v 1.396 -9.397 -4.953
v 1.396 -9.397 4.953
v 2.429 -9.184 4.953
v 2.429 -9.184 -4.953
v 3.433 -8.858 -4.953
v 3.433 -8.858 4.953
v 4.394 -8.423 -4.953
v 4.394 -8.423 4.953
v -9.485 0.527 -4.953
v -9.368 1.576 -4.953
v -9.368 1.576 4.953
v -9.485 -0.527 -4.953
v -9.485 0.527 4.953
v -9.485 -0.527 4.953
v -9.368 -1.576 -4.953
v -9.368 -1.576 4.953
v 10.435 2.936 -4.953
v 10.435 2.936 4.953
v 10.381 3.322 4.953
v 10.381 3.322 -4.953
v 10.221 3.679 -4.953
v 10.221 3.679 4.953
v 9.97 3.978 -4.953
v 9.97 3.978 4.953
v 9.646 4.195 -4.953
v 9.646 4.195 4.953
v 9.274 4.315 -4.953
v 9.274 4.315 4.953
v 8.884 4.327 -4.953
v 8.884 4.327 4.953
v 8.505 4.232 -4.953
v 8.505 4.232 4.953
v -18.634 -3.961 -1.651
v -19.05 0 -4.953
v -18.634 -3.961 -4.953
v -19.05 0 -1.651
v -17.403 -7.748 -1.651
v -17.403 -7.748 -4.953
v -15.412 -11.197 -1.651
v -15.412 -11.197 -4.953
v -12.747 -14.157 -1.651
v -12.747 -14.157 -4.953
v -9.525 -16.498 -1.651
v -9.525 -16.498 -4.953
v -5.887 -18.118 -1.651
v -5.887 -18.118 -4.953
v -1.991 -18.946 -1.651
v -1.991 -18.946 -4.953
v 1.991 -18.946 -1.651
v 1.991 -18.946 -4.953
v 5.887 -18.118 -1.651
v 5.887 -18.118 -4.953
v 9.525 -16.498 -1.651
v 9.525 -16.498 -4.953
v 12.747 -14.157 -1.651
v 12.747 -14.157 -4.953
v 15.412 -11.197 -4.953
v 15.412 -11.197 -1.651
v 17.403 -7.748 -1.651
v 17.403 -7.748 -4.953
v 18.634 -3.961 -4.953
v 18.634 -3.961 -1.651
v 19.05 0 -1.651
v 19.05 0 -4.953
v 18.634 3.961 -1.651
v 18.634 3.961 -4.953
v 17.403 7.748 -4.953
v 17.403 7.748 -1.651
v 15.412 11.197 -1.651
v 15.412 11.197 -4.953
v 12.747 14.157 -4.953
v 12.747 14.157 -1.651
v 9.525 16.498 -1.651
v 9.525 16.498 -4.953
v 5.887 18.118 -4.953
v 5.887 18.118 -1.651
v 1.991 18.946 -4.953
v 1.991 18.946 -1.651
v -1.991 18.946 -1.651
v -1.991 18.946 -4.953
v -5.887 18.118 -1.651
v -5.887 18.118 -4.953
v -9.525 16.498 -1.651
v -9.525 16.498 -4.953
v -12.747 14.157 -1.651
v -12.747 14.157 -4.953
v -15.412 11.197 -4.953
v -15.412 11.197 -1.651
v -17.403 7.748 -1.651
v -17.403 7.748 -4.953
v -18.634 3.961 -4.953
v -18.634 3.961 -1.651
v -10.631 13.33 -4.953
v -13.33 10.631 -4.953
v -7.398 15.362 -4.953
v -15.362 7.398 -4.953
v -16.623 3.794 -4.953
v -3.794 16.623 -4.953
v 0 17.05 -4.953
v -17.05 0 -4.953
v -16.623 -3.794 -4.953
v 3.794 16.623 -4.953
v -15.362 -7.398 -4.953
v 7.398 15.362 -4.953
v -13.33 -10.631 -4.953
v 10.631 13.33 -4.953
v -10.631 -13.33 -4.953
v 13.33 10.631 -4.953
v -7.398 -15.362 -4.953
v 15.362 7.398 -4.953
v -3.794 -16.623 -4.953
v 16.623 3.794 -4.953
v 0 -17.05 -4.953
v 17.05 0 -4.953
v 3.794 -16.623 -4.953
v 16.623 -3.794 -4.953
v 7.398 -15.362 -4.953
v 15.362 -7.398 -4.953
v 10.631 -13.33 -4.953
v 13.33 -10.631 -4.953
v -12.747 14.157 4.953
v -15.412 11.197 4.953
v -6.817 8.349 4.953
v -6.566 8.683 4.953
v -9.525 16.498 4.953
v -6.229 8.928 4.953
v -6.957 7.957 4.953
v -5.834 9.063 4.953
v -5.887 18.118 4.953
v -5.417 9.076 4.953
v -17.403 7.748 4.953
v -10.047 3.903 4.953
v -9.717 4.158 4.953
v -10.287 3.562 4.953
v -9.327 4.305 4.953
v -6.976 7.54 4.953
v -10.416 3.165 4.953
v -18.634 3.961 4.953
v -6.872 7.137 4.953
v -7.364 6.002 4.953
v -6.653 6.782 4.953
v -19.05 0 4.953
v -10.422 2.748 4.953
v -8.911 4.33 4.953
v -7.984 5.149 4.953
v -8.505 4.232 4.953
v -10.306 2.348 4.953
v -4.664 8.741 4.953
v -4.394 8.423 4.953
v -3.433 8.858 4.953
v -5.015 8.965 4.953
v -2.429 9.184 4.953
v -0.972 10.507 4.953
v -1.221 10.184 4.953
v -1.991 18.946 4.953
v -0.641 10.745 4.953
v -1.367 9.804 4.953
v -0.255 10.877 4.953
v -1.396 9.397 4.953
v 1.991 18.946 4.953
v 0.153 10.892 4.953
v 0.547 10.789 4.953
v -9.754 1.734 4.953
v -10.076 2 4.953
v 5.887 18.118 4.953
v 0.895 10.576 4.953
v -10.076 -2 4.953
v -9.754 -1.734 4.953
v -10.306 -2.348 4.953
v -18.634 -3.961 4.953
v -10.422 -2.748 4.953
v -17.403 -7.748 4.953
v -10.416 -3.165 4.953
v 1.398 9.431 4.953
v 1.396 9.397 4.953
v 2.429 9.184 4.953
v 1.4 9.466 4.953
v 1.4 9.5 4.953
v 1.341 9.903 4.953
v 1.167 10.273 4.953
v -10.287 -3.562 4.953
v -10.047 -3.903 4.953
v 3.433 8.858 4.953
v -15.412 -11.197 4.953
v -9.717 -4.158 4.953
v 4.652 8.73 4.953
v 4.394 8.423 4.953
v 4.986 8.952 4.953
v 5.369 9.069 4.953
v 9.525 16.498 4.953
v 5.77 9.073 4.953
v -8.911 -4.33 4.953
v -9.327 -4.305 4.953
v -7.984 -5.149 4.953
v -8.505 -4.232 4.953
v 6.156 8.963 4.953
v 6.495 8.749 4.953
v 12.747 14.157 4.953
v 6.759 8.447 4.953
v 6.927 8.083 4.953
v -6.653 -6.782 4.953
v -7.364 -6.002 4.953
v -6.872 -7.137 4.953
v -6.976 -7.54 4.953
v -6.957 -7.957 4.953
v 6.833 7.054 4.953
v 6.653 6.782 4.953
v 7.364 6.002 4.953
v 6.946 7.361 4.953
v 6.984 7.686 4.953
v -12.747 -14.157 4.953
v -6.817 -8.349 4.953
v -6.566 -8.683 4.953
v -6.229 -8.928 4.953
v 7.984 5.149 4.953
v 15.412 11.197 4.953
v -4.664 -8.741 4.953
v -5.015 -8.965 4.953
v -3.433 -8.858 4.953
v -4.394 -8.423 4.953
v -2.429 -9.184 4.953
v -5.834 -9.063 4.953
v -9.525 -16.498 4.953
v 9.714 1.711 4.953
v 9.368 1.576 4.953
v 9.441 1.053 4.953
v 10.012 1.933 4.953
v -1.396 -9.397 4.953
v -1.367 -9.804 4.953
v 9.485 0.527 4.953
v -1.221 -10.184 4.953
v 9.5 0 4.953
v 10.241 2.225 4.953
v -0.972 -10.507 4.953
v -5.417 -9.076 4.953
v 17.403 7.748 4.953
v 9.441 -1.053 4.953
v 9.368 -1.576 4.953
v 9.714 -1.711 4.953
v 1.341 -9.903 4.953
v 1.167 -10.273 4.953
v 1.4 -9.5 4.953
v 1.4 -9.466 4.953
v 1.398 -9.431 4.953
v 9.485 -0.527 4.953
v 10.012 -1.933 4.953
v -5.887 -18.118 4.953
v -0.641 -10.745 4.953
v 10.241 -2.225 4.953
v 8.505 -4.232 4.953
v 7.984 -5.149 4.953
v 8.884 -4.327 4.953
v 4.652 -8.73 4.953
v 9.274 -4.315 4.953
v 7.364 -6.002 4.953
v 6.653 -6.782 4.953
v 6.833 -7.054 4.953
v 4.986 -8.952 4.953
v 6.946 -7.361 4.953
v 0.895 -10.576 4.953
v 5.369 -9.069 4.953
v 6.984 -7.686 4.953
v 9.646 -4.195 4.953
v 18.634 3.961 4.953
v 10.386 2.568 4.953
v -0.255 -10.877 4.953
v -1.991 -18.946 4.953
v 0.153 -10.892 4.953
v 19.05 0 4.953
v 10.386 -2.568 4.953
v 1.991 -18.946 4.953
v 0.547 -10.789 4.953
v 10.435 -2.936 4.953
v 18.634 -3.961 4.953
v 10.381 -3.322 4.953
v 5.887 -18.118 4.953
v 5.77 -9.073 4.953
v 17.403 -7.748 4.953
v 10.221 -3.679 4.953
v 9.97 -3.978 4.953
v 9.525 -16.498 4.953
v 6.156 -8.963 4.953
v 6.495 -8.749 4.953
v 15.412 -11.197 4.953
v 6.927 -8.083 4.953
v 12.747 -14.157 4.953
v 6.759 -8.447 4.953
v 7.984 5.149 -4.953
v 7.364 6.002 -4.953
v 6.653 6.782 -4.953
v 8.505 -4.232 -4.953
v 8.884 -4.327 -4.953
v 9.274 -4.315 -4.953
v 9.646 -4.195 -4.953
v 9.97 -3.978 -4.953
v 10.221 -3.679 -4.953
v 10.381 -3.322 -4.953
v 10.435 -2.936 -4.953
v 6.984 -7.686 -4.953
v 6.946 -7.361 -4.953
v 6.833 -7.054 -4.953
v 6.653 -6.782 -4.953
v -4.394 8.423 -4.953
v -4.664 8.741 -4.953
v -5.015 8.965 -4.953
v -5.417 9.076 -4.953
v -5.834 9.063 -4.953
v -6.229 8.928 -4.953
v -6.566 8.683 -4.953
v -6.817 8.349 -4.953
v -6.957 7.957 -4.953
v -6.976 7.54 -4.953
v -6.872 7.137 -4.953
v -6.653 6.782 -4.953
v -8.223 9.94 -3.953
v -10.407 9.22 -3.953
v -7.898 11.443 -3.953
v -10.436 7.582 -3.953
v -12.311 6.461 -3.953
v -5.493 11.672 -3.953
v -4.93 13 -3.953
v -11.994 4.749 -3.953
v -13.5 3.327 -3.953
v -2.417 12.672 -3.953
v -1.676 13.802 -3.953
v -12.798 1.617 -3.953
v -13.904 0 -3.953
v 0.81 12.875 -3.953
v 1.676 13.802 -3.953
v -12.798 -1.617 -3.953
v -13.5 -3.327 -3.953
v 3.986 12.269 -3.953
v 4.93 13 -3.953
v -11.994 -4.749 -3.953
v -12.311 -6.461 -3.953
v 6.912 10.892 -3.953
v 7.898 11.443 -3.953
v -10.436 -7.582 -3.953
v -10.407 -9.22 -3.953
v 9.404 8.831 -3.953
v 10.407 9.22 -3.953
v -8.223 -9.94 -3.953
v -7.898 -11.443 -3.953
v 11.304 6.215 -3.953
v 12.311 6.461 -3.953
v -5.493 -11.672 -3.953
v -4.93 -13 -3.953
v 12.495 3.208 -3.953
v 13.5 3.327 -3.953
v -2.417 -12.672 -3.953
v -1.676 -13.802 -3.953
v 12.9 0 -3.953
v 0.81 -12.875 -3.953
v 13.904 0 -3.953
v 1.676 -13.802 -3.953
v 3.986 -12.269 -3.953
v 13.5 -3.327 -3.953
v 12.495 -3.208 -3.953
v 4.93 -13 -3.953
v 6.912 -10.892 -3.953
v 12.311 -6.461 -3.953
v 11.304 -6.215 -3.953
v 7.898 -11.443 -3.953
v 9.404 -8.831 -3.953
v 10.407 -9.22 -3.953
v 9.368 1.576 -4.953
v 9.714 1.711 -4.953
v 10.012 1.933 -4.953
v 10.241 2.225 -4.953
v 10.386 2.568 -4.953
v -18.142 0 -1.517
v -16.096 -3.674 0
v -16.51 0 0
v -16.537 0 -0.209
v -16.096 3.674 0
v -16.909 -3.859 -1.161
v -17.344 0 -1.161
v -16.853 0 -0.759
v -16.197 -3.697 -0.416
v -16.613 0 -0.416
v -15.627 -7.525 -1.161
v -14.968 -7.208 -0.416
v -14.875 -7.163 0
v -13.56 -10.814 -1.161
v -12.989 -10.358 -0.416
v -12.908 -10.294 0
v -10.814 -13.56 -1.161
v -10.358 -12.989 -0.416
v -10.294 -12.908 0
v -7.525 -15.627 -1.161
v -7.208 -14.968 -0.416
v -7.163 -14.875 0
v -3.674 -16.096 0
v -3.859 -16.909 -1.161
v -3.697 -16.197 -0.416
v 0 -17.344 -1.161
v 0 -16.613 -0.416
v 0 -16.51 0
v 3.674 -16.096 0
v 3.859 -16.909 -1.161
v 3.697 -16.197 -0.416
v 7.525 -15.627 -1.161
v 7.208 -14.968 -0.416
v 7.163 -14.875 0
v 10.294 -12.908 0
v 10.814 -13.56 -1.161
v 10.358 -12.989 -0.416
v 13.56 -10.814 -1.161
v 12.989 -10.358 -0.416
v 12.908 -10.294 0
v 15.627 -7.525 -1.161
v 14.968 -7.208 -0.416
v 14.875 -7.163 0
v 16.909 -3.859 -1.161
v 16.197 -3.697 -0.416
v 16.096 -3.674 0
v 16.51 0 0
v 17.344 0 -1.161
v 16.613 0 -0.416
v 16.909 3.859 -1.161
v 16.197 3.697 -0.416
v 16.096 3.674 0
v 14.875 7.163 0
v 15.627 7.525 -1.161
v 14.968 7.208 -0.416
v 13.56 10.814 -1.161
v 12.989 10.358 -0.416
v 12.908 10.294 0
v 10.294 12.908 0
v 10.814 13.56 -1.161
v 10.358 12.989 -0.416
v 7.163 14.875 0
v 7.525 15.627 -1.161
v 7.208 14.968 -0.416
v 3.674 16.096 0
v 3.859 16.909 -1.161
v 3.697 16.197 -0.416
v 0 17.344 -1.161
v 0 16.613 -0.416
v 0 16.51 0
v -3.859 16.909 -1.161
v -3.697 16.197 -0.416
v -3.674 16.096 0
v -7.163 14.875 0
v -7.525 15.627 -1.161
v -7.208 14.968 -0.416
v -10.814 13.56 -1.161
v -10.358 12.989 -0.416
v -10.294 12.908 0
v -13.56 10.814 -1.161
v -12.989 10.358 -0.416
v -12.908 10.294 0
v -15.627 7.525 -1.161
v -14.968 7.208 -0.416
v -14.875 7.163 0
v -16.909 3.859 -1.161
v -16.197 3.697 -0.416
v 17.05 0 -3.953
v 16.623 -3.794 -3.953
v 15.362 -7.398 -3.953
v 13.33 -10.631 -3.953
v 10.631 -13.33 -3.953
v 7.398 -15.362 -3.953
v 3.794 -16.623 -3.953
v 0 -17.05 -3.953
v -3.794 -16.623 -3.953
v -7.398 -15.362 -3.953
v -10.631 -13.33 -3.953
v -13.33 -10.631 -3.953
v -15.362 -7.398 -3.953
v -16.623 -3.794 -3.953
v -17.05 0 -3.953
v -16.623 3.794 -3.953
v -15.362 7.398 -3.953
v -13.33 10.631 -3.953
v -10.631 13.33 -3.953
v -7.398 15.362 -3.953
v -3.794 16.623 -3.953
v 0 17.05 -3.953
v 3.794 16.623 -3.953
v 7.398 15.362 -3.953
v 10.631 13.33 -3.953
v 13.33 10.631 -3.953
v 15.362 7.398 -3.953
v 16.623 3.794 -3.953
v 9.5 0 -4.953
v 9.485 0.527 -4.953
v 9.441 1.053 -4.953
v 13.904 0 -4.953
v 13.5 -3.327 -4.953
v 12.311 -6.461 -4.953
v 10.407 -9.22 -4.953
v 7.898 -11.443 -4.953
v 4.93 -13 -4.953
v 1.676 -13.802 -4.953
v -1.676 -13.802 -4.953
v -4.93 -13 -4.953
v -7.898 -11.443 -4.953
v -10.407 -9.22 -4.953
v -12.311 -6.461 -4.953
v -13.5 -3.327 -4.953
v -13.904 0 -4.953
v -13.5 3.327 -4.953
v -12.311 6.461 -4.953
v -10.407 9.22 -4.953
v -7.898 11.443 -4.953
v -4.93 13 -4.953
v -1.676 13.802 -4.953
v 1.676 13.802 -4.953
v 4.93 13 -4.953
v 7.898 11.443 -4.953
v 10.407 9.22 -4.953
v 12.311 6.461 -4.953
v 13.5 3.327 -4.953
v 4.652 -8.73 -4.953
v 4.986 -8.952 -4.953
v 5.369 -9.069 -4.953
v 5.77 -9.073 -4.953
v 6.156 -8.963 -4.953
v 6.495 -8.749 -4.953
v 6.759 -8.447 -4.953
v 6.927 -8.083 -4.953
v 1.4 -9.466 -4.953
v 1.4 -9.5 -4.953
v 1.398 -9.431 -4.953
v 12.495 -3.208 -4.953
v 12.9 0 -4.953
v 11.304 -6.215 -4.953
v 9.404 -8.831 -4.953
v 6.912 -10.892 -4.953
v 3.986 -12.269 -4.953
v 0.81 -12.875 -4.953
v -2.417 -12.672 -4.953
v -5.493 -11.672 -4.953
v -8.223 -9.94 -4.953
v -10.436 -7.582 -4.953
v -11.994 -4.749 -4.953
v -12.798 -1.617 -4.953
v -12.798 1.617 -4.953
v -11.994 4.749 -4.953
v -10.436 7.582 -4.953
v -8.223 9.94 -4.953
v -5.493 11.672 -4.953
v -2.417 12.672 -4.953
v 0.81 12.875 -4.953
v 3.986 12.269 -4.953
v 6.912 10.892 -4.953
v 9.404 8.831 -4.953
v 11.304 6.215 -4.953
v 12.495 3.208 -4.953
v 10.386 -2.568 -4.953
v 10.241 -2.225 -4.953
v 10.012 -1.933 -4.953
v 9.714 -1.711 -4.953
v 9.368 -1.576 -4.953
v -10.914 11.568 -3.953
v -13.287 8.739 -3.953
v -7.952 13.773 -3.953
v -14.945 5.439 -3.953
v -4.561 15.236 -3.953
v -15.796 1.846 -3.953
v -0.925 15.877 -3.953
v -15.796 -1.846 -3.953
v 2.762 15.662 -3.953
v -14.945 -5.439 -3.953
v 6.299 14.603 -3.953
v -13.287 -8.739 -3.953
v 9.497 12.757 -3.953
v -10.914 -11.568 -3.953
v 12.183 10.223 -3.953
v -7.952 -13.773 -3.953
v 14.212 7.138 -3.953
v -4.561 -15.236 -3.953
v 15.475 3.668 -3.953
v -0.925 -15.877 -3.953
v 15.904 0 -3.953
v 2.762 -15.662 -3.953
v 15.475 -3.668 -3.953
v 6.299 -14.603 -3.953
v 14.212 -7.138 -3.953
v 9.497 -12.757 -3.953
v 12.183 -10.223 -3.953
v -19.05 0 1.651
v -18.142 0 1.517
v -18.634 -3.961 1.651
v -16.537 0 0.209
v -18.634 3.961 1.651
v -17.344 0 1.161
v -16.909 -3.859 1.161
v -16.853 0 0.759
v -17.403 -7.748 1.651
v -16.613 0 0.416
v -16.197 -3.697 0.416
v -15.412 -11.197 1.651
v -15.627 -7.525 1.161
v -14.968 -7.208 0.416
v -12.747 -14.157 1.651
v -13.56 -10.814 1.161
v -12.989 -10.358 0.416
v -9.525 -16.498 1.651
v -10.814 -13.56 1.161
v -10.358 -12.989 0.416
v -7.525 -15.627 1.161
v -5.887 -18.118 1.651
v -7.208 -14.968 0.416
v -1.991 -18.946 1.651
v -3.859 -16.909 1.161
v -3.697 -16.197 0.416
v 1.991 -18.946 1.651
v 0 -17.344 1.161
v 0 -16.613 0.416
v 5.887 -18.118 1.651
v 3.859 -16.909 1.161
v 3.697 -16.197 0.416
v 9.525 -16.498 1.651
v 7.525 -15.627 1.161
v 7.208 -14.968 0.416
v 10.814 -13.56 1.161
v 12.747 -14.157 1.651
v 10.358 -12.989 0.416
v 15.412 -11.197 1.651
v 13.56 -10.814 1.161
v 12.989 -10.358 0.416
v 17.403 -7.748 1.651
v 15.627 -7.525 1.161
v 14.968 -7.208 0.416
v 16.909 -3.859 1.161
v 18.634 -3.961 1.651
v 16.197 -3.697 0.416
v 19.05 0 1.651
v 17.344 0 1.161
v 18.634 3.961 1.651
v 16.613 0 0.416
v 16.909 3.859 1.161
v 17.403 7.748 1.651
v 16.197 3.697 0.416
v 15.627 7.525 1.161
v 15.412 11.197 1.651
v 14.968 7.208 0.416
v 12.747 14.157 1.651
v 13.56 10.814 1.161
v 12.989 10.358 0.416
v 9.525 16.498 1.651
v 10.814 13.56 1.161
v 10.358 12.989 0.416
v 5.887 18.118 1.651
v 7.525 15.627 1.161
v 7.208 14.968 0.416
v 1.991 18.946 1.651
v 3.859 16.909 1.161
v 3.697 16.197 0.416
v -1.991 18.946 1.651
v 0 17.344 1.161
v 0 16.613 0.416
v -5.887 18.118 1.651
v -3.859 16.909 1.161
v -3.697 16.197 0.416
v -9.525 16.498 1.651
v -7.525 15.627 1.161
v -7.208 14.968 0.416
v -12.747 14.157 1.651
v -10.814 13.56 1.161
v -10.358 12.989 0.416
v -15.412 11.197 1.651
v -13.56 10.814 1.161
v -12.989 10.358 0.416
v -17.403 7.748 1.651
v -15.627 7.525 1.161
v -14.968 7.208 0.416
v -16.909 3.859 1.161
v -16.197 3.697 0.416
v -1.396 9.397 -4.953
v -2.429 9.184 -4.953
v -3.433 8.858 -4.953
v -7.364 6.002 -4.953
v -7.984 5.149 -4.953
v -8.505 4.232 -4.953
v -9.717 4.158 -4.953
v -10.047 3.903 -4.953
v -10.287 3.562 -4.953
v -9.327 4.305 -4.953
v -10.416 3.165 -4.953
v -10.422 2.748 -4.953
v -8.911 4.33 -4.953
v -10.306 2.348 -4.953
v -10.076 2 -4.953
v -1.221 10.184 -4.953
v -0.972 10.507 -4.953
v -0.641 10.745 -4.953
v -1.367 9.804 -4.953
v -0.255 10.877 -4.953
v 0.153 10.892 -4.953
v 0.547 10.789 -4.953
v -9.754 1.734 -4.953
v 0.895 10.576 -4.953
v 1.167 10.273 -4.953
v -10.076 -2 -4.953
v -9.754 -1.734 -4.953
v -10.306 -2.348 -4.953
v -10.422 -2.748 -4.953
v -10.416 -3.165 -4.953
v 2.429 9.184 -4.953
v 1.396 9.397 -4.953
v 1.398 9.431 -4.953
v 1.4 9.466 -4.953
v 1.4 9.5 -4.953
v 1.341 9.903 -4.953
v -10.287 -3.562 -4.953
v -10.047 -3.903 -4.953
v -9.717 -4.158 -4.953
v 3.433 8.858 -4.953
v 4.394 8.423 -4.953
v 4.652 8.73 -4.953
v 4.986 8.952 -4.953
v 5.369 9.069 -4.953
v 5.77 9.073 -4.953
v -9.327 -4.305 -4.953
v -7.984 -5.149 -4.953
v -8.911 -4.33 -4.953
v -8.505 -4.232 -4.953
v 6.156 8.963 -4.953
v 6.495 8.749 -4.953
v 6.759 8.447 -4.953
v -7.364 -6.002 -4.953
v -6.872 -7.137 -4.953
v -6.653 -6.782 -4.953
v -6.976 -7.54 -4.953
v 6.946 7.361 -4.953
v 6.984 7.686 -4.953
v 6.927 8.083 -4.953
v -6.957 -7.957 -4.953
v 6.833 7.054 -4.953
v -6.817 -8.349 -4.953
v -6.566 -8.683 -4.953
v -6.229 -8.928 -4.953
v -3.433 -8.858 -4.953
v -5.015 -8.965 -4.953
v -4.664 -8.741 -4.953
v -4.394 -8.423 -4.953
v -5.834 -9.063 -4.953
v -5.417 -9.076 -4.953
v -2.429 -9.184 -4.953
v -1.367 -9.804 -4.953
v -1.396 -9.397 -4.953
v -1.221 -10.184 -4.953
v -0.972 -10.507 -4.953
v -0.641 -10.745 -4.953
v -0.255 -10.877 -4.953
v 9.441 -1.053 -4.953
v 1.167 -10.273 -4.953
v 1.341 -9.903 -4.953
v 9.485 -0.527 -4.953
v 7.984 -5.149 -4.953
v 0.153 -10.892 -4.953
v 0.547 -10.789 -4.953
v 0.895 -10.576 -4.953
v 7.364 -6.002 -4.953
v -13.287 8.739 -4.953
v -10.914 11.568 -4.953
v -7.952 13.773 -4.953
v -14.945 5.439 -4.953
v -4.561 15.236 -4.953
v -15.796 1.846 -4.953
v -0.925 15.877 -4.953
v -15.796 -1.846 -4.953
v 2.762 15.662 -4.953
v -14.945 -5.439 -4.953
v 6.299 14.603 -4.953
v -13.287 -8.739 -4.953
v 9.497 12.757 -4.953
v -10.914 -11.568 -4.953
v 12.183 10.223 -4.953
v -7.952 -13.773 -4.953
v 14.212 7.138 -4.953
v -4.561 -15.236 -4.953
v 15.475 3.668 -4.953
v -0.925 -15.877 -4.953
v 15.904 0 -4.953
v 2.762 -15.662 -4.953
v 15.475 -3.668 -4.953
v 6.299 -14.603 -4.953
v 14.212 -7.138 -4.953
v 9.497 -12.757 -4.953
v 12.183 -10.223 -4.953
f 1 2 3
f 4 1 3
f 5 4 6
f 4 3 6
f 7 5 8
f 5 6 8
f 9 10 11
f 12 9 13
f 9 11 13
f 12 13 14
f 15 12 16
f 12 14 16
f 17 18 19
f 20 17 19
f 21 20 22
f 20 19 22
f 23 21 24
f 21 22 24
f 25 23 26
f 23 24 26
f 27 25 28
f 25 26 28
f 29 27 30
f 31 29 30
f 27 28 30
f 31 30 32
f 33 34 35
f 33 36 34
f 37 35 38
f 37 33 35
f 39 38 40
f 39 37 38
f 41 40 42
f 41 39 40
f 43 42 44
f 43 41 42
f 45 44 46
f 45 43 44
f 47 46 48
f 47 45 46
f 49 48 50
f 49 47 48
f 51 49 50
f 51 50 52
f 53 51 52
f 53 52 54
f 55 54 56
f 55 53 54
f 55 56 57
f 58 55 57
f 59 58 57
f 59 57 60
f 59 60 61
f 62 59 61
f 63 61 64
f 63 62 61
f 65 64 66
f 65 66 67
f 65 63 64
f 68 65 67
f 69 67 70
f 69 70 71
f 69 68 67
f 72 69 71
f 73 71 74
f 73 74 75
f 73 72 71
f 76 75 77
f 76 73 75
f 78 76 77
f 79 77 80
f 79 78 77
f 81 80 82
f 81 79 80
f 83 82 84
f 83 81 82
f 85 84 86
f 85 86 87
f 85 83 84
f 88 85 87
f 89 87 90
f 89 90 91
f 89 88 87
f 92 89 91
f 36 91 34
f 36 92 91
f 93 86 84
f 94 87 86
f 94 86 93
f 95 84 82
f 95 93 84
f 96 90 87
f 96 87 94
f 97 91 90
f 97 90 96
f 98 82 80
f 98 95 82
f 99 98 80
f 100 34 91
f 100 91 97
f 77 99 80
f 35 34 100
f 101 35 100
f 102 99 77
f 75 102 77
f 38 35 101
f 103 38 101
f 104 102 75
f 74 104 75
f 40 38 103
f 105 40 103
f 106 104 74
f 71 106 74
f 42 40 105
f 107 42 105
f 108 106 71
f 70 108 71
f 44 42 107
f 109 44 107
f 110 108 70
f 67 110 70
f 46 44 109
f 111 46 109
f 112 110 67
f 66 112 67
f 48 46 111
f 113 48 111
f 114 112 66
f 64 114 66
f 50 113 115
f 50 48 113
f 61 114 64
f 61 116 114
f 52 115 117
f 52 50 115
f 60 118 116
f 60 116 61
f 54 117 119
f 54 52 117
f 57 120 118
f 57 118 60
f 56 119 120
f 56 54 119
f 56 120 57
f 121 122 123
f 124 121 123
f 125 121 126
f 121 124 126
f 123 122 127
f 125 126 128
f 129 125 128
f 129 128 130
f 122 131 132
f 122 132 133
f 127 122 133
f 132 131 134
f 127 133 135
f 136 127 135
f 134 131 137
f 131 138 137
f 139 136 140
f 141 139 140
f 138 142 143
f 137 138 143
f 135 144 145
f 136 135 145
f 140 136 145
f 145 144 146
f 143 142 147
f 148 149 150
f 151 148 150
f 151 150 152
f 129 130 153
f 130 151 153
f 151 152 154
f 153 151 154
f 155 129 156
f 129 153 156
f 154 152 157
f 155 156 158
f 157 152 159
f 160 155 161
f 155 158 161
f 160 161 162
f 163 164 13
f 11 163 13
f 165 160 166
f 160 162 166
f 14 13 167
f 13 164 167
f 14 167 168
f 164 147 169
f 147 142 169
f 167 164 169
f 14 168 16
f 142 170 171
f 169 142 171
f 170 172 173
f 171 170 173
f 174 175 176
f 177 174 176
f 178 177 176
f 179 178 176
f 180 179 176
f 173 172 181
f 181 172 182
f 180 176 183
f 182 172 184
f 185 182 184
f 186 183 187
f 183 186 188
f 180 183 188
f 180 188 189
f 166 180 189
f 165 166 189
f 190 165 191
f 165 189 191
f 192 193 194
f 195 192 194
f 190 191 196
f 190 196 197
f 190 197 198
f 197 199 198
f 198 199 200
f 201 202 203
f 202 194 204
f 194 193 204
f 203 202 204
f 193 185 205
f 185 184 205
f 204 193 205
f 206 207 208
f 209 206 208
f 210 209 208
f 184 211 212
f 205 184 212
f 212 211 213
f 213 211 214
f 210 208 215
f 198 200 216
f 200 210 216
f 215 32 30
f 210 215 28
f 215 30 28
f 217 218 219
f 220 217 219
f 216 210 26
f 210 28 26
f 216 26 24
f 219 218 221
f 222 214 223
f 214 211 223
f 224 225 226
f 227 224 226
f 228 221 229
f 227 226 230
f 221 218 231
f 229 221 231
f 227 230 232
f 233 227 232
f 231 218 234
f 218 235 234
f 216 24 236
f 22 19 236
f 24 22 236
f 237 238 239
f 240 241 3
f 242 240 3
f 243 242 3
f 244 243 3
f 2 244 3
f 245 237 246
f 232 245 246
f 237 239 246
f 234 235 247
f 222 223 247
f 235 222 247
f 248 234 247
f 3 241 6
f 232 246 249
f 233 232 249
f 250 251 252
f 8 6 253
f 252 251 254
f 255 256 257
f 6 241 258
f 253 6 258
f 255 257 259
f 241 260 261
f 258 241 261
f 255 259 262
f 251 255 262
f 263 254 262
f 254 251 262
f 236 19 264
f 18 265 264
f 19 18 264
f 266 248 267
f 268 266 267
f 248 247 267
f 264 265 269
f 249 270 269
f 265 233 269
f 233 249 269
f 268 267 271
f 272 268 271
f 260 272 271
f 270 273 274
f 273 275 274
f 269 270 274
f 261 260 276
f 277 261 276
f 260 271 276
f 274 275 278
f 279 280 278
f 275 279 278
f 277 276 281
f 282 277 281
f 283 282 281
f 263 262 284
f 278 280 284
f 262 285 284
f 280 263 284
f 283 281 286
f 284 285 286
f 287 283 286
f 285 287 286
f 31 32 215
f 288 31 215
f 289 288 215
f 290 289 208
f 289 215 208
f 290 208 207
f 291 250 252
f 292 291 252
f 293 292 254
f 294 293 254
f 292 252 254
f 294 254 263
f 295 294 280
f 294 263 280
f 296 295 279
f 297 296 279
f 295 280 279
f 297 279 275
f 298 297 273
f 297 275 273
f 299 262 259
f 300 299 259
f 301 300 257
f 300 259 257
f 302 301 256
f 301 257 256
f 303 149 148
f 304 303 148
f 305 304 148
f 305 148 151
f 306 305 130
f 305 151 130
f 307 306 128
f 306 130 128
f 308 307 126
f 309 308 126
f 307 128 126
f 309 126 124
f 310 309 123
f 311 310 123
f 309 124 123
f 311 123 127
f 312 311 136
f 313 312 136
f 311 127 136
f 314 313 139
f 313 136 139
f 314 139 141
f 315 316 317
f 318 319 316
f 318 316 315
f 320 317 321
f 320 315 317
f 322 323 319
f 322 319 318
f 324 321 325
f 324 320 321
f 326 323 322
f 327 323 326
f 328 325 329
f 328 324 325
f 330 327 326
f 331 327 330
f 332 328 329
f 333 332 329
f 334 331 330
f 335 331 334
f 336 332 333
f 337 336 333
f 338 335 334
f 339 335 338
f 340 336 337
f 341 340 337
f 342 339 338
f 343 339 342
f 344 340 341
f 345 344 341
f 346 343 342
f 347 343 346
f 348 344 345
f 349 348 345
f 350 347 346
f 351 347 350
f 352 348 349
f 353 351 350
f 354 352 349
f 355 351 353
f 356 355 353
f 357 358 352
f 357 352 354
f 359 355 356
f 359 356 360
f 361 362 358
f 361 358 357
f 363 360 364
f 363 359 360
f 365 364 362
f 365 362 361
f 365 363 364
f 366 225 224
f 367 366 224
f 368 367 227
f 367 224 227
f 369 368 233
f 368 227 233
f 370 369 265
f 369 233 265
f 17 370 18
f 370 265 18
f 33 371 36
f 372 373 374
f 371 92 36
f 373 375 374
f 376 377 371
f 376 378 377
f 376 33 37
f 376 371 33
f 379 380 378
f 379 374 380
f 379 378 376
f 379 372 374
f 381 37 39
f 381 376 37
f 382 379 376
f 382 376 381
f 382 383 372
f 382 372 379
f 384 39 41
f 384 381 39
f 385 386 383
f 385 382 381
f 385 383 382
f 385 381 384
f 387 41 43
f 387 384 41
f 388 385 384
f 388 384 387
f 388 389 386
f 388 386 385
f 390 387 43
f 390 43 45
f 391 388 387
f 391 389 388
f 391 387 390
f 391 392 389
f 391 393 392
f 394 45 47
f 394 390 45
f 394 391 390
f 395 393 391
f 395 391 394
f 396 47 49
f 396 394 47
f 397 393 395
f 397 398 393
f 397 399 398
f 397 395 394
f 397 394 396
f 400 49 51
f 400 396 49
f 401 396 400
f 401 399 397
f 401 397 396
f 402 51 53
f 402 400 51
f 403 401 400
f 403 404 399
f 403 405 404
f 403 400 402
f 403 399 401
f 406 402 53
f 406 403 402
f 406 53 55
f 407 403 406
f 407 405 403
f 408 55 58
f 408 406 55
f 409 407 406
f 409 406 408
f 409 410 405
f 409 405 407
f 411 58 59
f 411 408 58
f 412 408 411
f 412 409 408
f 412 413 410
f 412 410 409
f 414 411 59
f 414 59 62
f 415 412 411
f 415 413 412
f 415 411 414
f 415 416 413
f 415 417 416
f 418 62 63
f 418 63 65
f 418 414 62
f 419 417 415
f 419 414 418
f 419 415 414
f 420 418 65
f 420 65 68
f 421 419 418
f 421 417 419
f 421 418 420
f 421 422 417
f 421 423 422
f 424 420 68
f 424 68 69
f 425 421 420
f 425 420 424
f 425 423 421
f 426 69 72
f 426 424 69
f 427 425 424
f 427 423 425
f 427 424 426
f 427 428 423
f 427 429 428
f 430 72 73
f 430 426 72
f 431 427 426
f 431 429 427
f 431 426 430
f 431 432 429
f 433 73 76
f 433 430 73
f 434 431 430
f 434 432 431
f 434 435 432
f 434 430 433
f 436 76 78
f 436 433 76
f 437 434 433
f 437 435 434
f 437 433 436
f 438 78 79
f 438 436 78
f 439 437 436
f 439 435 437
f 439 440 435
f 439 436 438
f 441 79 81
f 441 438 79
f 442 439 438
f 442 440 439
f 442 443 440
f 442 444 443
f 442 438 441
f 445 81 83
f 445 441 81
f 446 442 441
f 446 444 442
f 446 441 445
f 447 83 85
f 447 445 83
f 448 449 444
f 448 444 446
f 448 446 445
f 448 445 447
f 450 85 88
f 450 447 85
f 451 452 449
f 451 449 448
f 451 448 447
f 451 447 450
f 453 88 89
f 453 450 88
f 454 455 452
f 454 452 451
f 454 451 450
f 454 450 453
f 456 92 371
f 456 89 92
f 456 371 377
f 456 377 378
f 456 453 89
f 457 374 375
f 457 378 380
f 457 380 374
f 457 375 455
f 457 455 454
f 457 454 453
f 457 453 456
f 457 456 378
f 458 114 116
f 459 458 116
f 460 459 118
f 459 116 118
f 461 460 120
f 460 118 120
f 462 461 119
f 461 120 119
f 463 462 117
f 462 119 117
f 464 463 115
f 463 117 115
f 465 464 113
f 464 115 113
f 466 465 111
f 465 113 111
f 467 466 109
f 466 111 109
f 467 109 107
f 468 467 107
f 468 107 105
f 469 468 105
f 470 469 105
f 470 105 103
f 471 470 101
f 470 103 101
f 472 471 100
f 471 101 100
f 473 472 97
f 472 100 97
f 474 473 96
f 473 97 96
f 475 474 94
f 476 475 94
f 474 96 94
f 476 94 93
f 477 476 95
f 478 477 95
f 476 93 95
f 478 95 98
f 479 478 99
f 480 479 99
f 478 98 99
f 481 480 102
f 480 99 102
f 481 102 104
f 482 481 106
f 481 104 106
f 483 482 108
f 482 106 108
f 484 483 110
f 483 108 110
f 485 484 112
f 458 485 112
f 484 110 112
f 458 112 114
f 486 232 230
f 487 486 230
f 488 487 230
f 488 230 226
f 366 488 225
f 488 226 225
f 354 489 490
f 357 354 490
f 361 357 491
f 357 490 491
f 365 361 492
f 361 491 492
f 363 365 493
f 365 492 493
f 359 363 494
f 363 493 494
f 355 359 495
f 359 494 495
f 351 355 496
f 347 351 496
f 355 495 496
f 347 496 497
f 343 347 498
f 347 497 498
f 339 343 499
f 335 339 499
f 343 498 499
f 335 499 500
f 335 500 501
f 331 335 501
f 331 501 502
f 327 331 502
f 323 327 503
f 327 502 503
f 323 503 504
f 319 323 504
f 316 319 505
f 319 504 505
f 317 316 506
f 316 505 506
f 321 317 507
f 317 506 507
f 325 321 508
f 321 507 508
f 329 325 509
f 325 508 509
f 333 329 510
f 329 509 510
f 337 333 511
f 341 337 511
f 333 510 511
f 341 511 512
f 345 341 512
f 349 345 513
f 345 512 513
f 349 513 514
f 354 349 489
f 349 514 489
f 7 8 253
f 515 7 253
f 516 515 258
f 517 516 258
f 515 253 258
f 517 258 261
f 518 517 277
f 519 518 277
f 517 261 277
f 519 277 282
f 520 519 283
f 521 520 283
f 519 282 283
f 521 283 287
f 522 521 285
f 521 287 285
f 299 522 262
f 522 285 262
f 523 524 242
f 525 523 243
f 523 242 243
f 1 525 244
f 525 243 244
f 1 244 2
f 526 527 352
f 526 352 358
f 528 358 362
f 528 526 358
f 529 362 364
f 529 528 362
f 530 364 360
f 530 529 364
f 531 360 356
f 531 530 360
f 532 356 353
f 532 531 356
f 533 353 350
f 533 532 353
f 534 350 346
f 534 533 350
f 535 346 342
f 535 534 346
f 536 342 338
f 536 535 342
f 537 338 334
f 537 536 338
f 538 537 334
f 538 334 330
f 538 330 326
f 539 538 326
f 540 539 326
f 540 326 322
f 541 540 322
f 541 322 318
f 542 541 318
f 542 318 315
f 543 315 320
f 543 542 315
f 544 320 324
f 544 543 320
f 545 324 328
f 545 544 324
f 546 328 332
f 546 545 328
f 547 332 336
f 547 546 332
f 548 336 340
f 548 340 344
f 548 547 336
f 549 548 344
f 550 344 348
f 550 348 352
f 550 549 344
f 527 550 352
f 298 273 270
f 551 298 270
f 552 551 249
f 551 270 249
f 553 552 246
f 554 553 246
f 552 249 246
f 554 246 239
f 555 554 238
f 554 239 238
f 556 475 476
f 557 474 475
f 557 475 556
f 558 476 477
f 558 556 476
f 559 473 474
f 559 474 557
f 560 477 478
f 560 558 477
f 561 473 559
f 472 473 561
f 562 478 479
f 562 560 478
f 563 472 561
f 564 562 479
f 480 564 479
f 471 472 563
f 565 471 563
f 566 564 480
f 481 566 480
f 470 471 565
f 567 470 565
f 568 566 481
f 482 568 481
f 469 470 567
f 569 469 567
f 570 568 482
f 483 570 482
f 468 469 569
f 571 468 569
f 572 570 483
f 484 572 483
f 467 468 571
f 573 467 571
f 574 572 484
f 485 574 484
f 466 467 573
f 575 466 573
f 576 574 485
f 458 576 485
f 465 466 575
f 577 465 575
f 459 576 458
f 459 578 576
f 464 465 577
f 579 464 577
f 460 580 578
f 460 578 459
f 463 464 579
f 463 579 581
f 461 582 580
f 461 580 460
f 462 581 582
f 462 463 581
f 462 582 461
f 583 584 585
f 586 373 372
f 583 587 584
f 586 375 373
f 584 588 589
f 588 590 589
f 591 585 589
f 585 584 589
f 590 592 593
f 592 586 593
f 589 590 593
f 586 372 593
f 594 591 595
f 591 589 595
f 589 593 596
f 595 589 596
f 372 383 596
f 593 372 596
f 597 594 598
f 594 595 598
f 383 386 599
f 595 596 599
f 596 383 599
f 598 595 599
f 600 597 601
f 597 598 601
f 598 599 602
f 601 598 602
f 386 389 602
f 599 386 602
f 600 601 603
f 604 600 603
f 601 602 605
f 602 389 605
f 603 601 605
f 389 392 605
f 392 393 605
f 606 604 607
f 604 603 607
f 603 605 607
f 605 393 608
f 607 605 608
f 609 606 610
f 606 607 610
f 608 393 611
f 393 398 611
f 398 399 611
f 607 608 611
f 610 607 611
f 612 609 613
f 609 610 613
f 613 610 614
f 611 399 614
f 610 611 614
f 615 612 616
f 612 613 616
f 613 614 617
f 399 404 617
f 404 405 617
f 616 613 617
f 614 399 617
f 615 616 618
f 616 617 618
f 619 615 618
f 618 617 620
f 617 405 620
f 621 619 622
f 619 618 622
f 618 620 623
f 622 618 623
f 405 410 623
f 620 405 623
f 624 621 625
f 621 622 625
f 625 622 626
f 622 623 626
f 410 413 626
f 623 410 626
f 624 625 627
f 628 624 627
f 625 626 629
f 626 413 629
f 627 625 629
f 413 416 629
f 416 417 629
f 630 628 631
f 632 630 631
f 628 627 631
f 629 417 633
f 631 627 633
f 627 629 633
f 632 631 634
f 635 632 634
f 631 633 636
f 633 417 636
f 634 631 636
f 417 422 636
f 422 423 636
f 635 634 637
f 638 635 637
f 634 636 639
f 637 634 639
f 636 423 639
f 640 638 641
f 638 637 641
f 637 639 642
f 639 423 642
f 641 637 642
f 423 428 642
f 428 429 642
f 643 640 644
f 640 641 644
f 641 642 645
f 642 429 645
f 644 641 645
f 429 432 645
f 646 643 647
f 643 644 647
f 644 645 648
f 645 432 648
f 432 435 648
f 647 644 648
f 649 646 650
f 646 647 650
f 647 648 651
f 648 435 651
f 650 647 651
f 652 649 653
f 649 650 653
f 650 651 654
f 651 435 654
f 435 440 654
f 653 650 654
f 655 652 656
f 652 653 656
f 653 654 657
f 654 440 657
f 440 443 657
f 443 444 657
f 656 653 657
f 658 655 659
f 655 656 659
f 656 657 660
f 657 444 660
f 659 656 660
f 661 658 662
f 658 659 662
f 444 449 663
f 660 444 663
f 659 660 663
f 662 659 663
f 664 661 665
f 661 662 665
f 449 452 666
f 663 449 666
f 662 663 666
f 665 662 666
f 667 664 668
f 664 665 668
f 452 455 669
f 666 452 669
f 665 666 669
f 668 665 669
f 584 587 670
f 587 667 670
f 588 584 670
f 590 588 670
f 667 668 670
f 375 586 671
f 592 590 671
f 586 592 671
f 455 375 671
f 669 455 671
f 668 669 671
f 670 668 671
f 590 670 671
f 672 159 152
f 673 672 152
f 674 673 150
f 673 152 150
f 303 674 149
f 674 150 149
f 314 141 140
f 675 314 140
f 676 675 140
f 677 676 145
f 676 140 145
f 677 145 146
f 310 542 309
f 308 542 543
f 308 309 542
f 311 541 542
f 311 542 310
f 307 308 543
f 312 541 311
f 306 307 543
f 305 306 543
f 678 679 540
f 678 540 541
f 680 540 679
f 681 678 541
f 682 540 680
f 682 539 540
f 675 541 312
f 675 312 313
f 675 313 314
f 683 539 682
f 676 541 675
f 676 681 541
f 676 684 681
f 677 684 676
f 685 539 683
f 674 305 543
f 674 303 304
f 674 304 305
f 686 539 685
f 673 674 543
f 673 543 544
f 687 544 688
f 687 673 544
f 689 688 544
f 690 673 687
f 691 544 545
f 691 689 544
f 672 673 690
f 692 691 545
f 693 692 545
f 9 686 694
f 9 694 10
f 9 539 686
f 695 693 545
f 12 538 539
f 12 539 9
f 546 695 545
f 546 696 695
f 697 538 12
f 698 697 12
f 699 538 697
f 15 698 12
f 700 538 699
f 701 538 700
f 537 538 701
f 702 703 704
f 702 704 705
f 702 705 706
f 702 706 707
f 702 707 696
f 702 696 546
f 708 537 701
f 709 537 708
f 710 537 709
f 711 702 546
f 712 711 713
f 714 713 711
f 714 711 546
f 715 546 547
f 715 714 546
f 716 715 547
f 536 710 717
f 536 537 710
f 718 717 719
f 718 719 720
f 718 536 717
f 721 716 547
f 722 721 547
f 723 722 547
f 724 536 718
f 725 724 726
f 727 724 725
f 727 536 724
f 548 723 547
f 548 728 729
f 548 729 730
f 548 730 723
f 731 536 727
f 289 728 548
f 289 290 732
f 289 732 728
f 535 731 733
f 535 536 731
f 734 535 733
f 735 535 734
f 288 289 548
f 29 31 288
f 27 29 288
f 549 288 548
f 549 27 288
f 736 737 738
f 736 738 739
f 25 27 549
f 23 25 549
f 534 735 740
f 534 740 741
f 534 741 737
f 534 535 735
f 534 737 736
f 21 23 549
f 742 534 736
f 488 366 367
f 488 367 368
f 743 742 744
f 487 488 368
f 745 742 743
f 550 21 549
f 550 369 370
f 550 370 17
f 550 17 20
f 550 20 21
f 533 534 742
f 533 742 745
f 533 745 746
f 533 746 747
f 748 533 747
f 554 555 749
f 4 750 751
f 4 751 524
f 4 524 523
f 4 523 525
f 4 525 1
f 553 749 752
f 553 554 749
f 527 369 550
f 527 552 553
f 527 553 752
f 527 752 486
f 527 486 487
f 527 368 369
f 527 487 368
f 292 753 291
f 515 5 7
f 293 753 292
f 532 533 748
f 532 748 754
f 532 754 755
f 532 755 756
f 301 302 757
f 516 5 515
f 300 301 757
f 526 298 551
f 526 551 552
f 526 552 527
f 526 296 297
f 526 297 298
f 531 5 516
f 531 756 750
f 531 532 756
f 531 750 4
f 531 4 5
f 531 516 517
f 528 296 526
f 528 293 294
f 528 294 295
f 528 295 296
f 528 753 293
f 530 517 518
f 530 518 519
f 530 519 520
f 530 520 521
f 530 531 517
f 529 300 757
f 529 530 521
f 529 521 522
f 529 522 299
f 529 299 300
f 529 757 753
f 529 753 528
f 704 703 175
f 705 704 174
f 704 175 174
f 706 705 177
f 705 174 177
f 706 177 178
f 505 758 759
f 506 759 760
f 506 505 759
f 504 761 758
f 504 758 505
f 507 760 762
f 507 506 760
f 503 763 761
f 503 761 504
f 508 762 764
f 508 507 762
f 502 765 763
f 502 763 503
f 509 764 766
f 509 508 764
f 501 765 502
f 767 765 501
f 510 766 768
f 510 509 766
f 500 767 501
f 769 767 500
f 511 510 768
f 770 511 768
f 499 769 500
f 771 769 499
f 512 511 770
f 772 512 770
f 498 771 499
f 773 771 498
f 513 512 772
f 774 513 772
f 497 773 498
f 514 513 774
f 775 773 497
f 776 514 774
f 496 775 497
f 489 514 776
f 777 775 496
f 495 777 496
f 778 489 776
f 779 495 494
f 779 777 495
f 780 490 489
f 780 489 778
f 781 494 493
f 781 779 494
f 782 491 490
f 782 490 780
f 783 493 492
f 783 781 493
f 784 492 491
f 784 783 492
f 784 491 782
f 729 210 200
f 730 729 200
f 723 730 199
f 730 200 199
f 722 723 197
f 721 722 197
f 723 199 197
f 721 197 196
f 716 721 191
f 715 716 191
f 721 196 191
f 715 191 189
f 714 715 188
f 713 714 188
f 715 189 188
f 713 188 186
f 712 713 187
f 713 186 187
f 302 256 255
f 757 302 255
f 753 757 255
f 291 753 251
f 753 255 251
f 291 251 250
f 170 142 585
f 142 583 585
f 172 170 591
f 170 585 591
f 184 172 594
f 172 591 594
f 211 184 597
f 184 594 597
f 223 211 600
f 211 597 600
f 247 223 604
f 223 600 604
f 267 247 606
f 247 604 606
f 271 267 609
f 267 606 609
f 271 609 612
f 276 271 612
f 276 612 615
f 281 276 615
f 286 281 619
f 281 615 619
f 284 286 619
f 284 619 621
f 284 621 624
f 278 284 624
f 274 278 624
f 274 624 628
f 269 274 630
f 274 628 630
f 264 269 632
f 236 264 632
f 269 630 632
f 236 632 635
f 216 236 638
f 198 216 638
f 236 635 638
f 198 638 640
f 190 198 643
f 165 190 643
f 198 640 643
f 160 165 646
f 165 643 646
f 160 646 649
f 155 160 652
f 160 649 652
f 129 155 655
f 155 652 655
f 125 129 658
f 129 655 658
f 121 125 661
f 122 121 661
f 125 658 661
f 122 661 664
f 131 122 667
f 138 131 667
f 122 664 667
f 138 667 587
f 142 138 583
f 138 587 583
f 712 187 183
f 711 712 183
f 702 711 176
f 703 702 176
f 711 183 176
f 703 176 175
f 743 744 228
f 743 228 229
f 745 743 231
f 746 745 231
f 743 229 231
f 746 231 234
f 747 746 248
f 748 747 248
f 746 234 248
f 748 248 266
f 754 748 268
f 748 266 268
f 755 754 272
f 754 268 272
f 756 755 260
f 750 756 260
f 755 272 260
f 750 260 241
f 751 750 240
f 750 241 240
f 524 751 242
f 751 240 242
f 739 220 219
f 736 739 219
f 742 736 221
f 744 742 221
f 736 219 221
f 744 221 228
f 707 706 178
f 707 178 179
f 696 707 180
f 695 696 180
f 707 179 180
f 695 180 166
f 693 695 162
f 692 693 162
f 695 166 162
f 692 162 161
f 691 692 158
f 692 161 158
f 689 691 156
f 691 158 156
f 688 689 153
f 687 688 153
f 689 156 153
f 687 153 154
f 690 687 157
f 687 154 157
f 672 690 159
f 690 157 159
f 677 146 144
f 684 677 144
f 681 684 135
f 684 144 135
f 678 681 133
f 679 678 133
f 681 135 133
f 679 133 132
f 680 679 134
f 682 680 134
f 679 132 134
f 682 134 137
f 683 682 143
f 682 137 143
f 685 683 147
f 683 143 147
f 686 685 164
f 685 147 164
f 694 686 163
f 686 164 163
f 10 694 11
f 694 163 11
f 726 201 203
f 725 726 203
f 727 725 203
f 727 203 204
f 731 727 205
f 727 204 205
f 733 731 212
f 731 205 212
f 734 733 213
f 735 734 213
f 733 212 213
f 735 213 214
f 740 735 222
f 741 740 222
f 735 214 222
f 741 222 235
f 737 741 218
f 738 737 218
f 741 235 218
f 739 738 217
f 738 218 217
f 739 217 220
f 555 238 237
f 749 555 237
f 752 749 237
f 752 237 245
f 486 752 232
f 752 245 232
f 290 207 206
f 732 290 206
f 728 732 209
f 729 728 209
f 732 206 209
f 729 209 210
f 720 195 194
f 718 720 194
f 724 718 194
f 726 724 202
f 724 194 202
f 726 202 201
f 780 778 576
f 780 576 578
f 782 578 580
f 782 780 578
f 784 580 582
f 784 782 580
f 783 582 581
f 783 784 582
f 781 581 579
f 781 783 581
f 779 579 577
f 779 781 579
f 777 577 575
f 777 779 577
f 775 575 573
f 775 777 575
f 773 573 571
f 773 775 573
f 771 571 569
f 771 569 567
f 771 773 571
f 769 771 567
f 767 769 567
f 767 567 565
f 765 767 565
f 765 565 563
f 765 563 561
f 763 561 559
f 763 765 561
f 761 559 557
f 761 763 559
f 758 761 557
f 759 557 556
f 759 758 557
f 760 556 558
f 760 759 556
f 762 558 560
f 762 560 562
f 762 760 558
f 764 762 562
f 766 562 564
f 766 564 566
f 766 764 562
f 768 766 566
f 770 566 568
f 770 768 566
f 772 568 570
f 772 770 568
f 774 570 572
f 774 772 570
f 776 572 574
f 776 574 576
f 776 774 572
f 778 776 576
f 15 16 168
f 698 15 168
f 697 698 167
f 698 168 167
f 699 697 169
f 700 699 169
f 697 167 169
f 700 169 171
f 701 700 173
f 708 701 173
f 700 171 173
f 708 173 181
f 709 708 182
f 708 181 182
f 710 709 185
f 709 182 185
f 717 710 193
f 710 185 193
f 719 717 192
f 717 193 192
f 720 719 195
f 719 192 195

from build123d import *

# Parameters (mm, degrees)
F4_DEPTH = 9.907
F5_R     = 17.05
F5_R_2   = 15.9037
F5_R_3   = 13.9037
F5_R_4   = 12.9
F6_DEPTH = 1


with BuildPart() as f1:
    # F0 (on Front) → F1 (revolve)
    with BuildSketch(Plane.XZ):
        Polygon((0, 0), (0, 4.953), (-19.05, 4.953), (-19.05, 1.651), (-16.51, 1.651), (-16.51, 0), align=None)
        with BuildLine():
            Line((-16.51, 1.651), (-19.05, 1.651))
            add(Edge.make_bspline(
                [(-19.05, 1.651), (-17.78, 1.651), (-16.51, 0.8255), (-16.51, 0)],
                knots=[0, 0, 0, 0, 3.0294225522, 3.0294225522, 3.0294225522, 3.0294225522], degree=3))
            Line((-16.51, 0), (-16.51, 1.651))
        make_face()
    revolve(axis=Axis((0, 0, 11.7816049606), (0, 0, 1)))

    # F2: F1 across plane


with BuildPart() as f1_1:
    add(f1.part)
    add(f1.part.mirror(Plane.XY))

    # F3 (on face) → F4 (cut, through all)
    with BuildSketch(Plane.XY.offset(4.953)):
        with BuildLine():
            ThreePointArc((9.3683756747, -1.5759242424), (9.4670367304, -0.790705726), (9.5, 0))
            ThreePointArc((9.5, 0), (9.4670367304, 0.790705726), (9.3683756747, 1.5759242424))
            ThreePointArc((9.3683756747, 1.5759242424), (7.703557782, 2.5030376544), (8.5054801589, 4.2316435656))
            ThreePointArc((8.5054801589, 4.2316435656), (7.6856614466, 5.5839598968), (6.6528701021, 6.7815425534))
            ThreePointArc((6.6528701021, 6.7815425534), (4.7610605436, 6.5530376544), (4.3937803131, 8.4228673598))
            ThreePointArc((4.3937803131, 8.4228673598), (2.9356614466, 9.0350369048), (1.3961942733, 9.3968421053))
            ThreePointArc((1.3961942733, 9.3968421053), (0, 8.1), (-1.3961942733, 9.3968421053))
            ThreePointArc((-1.3961942733, 9.3968421053), (-2.9356614466, 9.0350369048), (-4.3937803131, 8.4228673598))
            ThreePointArc((-4.3937803131, 8.4228673598), (-4.2374363327, 8.068903265), (-4.1839598968, 7.6856614466))
            ThreePointArc((-4.1839598968, 7.6856614466), (-5.102542348, 6.371037111), (-6.6528701021, 6.7815425534))
            ThreePointArc((-6.6528701021, 6.7815425534), (-7.6856614466, 5.5839598968), (-8.5054801589, 4.2316435656))
            ThreePointArc((-8.5054801589, 4.2316435656), (-7.8728451297, 3.7162447399), (-7.6350369048, 2.9356614466))
            ThreePointArc((-7.6350369048, 2.9356614466), (-8.1709403471, 1.8341456097), (-9.3683756747, 1.5759242424))
            ThreePointArc((-9.3683756747, 1.5759242424), (-9.5, 0), (-9.3683756747, -1.5759242424))
            ThreePointArc((-9.3683756747, -1.5759242424), (-8.1709403471, -1.8341456097), (-7.6350369048, -2.9356614466))
            ThreePointArc((-7.6350369048, -2.9356614466), (-7.8728451297, -3.7162447399), (-8.5054801589, -4.2316435656))
            ThreePointArc((-8.5054801589, -4.2316435656), (-7.6856614466, -5.5839598968), (-6.6528701021, -6.7815425534))
            ThreePointArc((-6.6528701021, -6.7815425534), (-5.102542348, -6.371037111), (-4.1839598968, -7.6856614466))
            ThreePointArc((-4.1839598968, -7.6856614466), (-4.2374363327, -8.068903265), (-4.3937803131, -8.4228673598))
            ThreePointArc((-4.3937803131, -8.4228673598), (-2.9356614466, -9.0350369048), (-1.3961942733, -9.3968421053))
            ThreePointArc((-1.3961942733, -9.3968421053), (0, -8.1), (1.3961942733, -9.3968421053))
            ThreePointArc((1.3961942733, -9.3968421053), (2.9356614466, -9.0350369048), (4.3937803131, -8.4228673598))
            ThreePointArc((4.3937803131, -8.4228673598), (4.7610605436, -6.5530376544), (6.6528701021, -6.7815425534))
            ThreePointArc((6.6528701021, -6.7815425534), (7.6856614466, -5.5839598968), (8.5054801589, -4.2316435656))
            ThreePointArc((8.5054801589, -4.2316435656), (7.703557782, -2.5030376544), (9.3683756747, -1.5759242424))
        make_face()
        with BuildLine():
            ThreePointArc((8.5054801589, 4.2316435656), (7.703557782, 2.5030376544), (9.3683756747, 1.5759242424))
            ThreePointArc((9.3683756747, 1.5759242424), (9.0350369048, 2.9356614466), (8.5054801589, 4.2316435656))
        make_face()
        with BuildLine():
            ThreePointArc((8.5054801589, 4.2316435656), (9.0350369048, 2.9356614466), (9.3683756747, 1.5759242424))
            ThreePointArc((9.3683756747, 1.5759242424), (10.1365527417, 2.0715648888), (10.4350369048, 2.9356614466))
            ThreePointArc((10.4350369048, 2.9356614466), (9.8156201982, 4.0978532217), (8.5054801589, 4.2316435656))
        make_face()
        with BuildLine():
            ThreePointArc((10.4350369048, -2.9356614466), (10.1365527417, -2.0715648888), (9.3683756747, -1.5759242424))
            ThreePointArc((9.3683756747, -1.5759242424), (9.0350369048, -2.9356614466), (8.5054801589, -4.2316435656))
            ThreePointArc((8.5054801589, -4.2316435656), (9.8156201982, -4.0978532217), (10.4350369048, -2.9356614466))
        make_face()
        with BuildLine():
            ThreePointArc((8.5054801589, -4.2316435656), (9.0350369048, -2.9356614466), (9.3683756747, -1.5759242424))
            ThreePointArc((9.3683756747, -1.5759242424), (7.703557782, -2.5030376544), (8.5054801589, -4.2316435656))
        make_face()
        with BuildLine():
            ThreePointArc((4.3937803131, 8.4228673598), (4.7610605436, 6.5530376544), (6.6528701021, 6.7815425534))
            ThreePointArc((6.6528701021, 6.7815425534), (5.5839598968, 7.6856614466), (4.3937803131, 8.4228673598))
        make_face()
        with BuildLine():
            ThreePointArc((4.3937803131, 8.4228673598), (5.5839598968, 7.6856614466), (6.6528701021, 6.7815425534))
            ThreePointArc((6.6528701021, 6.7815425534), (6.8985842324, 7.2042438978), (6.9839598968, 7.6856614466))
            ThreePointArc((6.9839598968, 7.6856614466), (5.9672017152, 9.0321850106), (4.3937803131, 8.4228673598))
        make_face()
        with BuildLine():
            ThreePointArc((6.9839598968, -7.6856614466), (6.8985842324, -7.2042438978), (6.6528701021, -6.7815425534))
            ThreePointArc((6.6528701021, -6.7815425534), (5.5839598968, -7.6856614466), (4.3937803131, -8.4228673598))
            ThreePointArc((4.3937803131, -8.4228673598), (5.9672017152, -9.0321850106), (6.9839598968, -7.6856614466))
        make_face()
        with BuildLine():
            ThreePointArc((4.3937803131, -8.4228673598), (5.5839598968, -7.6856614466), (6.6528701021, -6.7815425534))
            ThreePointArc((6.6528701021, -6.7815425534), (4.7610605436, -6.5530376544), (4.3937803131, -8.4228673598))
        make_face()
        with BuildLine():
            ThreePointArc((-1.3961942733, 9.3968421053), (0, 8.1), (1.3961942733, 9.3968421053))
            ThreePointArc((1.3961942733, 9.3968421053), (0, 9.5), (-1.3961942733, 9.3968421053))
        make_face()
        with BuildLine():
            ThreePointArc((-1.3961942733, 9.3968421053), (0, 9.5), (1.3961942733, 9.3968421053))
            ThreePointArc((1.3961942733, 9.3968421053), (1.3990482448, 9.4483859641), (1.4, 9.5))
            ThreePointArc((1.4, 9.5), (-0.0516140359, 10.8990482448), (-1.3961942733, 9.3968421053))
        make_face()
        with BuildLine():
            ThreePointArc((1.4, -9.5), (1.3990482448, -9.4483859641), (1.3961942733, -9.3968421053))
            ThreePointArc((1.3961942733, -9.3968421053), (0, -9.5), (-1.3961942733, -9.3968421053))
            ThreePointArc((-1.3961942733, -9.3968421053), (-0.0516140359, -10.8990482448), (1.4, -9.5))
        make_face()
        with BuildLine():
            ThreePointArc((-1.3961942733, -9.3968421053), (0, -9.5), (1.3961942733, -9.3968421053))
            ThreePointArc((1.3961942733, -9.3968421053), (0, -8.1), (-1.3961942733, -9.3968421053))
        make_face()
        with BuildLine():
            ThreePointArc((-4.1839598968, 7.6856614466), (-4.2374363327, 8.068903265), (-4.3937803131, 8.4228673598))
            ThreePointArc((-4.3937803131, 8.4228673598), (-5.5839598968, 7.6856614466), (-6.6528701021, 6.7815425534))
            ThreePointArc((-6.6528701021, 6.7815425534), (-5.102542348, 6.371037111), (-4.1839598968, 7.6856614466))
        make_face()
        with BuildLine():
            ThreePointArc((-6.6528701021, 6.7815425534), (-5.5839598968, 7.6856614466), (-4.3937803131, 8.4228673598))
            ThreePointArc((-4.3937803131, 8.4228673598), (-6.40685925, 8.8182852387), (-6.6528701021, 6.7815425534))
        make_face()
        with BuildLine():
            ThreePointArc((-6.6528701021, -6.7815425534), (-6.40685925, -8.8182852387), (-4.3937803131, -8.4228673598))
            ThreePointArc((-4.3937803131, -8.4228673598), (-5.5839598968, -7.6856614466), (-6.6528701021, -6.7815425534))
        make_face()
        with BuildLine():
            ThreePointArc((-6.6528701021, -6.7815425534), (-5.5839598968, -7.6856614466), (-4.3937803131, -8.4228673598))
            ThreePointArc((-4.3937803131, -8.4228673598), (-4.2374363327, -8.068903265), (-4.1839598968, -7.6856614466))
            ThreePointArc((-4.1839598968, -7.6856614466), (-5.102542348, -6.371037111), (-6.6528701021, -6.7815425534))
        make_face()
        with BuildLine():
            ThreePointArc((-7.6350369048, 2.9356614466), (-7.8728451297, 3.7162447399), (-8.5054801589, 4.2316435656))
            ThreePointArc((-8.5054801589, 4.2316435656), (-9.0350369048, 2.9356614466), (-9.3683756747, 1.5759242424))
            ThreePointArc((-9.3683756747, 1.5759242424), (-8.1709403471, 1.8341456097), (-7.6350369048, 2.9356614466))
        make_face()
        with BuildLine():
            ThreePointArc((-9.3683756747, 1.5759242424), (-9.0350369048, 2.9356614466), (-8.5054801589, 4.2316435656))
            ThreePointArc((-8.5054801589, 4.2316435656), (-10.3665160276, 3.3682852387), (-9.3683756747, 1.5759242424))
        make_face()
        with BuildLine():
            ThreePointArc((-9.3683756747, -1.5759242424), (-10.3665160276, -3.3682852387), (-8.5054801589, -4.2316435656))
            ThreePointArc((-8.5054801589, -4.2316435656), (-9.0350369048, -2.9356614466), (-9.3683756747, -1.5759242424))
        make_face()
        with BuildLine():
            ThreePointArc((-9.3683756747, -1.5759242424), (-9.0350369048, -2.9356614466), (-8.5054801589, -4.2316435656))
            ThreePointArc((-8.5054801589, -4.2316435656), (-7.8728451297, -3.7162447399), (-7.6350369048, -2.9356614466))
            ThreePointArc((-7.6350369048, -2.9356614466), (-8.1709403471, -1.8341456097), (-9.3683756747, -1.5759242424))
        make_face()
    extrude(amount=-F4_DEPTH, mode=Mode.SUBTRACT)

    # F5 (on face) → F6 (cut)
    with BuildSketch(Plane(origin=(0, 0, -4.953), x_dir=(1, 0, 0), z_dir=(0, 0, -1))):
        Circle(F5_R)
        Circle(F5_R_2, mode=Mode.SUBTRACT)
        Circle(F5_R_3)
        Circle(F5_R_4, mode=Mode.SUBTRACT)
    extrude(amount=-F6_DEPTH, mode=Mode.SUBTRACT)


solid = f1_1.part
